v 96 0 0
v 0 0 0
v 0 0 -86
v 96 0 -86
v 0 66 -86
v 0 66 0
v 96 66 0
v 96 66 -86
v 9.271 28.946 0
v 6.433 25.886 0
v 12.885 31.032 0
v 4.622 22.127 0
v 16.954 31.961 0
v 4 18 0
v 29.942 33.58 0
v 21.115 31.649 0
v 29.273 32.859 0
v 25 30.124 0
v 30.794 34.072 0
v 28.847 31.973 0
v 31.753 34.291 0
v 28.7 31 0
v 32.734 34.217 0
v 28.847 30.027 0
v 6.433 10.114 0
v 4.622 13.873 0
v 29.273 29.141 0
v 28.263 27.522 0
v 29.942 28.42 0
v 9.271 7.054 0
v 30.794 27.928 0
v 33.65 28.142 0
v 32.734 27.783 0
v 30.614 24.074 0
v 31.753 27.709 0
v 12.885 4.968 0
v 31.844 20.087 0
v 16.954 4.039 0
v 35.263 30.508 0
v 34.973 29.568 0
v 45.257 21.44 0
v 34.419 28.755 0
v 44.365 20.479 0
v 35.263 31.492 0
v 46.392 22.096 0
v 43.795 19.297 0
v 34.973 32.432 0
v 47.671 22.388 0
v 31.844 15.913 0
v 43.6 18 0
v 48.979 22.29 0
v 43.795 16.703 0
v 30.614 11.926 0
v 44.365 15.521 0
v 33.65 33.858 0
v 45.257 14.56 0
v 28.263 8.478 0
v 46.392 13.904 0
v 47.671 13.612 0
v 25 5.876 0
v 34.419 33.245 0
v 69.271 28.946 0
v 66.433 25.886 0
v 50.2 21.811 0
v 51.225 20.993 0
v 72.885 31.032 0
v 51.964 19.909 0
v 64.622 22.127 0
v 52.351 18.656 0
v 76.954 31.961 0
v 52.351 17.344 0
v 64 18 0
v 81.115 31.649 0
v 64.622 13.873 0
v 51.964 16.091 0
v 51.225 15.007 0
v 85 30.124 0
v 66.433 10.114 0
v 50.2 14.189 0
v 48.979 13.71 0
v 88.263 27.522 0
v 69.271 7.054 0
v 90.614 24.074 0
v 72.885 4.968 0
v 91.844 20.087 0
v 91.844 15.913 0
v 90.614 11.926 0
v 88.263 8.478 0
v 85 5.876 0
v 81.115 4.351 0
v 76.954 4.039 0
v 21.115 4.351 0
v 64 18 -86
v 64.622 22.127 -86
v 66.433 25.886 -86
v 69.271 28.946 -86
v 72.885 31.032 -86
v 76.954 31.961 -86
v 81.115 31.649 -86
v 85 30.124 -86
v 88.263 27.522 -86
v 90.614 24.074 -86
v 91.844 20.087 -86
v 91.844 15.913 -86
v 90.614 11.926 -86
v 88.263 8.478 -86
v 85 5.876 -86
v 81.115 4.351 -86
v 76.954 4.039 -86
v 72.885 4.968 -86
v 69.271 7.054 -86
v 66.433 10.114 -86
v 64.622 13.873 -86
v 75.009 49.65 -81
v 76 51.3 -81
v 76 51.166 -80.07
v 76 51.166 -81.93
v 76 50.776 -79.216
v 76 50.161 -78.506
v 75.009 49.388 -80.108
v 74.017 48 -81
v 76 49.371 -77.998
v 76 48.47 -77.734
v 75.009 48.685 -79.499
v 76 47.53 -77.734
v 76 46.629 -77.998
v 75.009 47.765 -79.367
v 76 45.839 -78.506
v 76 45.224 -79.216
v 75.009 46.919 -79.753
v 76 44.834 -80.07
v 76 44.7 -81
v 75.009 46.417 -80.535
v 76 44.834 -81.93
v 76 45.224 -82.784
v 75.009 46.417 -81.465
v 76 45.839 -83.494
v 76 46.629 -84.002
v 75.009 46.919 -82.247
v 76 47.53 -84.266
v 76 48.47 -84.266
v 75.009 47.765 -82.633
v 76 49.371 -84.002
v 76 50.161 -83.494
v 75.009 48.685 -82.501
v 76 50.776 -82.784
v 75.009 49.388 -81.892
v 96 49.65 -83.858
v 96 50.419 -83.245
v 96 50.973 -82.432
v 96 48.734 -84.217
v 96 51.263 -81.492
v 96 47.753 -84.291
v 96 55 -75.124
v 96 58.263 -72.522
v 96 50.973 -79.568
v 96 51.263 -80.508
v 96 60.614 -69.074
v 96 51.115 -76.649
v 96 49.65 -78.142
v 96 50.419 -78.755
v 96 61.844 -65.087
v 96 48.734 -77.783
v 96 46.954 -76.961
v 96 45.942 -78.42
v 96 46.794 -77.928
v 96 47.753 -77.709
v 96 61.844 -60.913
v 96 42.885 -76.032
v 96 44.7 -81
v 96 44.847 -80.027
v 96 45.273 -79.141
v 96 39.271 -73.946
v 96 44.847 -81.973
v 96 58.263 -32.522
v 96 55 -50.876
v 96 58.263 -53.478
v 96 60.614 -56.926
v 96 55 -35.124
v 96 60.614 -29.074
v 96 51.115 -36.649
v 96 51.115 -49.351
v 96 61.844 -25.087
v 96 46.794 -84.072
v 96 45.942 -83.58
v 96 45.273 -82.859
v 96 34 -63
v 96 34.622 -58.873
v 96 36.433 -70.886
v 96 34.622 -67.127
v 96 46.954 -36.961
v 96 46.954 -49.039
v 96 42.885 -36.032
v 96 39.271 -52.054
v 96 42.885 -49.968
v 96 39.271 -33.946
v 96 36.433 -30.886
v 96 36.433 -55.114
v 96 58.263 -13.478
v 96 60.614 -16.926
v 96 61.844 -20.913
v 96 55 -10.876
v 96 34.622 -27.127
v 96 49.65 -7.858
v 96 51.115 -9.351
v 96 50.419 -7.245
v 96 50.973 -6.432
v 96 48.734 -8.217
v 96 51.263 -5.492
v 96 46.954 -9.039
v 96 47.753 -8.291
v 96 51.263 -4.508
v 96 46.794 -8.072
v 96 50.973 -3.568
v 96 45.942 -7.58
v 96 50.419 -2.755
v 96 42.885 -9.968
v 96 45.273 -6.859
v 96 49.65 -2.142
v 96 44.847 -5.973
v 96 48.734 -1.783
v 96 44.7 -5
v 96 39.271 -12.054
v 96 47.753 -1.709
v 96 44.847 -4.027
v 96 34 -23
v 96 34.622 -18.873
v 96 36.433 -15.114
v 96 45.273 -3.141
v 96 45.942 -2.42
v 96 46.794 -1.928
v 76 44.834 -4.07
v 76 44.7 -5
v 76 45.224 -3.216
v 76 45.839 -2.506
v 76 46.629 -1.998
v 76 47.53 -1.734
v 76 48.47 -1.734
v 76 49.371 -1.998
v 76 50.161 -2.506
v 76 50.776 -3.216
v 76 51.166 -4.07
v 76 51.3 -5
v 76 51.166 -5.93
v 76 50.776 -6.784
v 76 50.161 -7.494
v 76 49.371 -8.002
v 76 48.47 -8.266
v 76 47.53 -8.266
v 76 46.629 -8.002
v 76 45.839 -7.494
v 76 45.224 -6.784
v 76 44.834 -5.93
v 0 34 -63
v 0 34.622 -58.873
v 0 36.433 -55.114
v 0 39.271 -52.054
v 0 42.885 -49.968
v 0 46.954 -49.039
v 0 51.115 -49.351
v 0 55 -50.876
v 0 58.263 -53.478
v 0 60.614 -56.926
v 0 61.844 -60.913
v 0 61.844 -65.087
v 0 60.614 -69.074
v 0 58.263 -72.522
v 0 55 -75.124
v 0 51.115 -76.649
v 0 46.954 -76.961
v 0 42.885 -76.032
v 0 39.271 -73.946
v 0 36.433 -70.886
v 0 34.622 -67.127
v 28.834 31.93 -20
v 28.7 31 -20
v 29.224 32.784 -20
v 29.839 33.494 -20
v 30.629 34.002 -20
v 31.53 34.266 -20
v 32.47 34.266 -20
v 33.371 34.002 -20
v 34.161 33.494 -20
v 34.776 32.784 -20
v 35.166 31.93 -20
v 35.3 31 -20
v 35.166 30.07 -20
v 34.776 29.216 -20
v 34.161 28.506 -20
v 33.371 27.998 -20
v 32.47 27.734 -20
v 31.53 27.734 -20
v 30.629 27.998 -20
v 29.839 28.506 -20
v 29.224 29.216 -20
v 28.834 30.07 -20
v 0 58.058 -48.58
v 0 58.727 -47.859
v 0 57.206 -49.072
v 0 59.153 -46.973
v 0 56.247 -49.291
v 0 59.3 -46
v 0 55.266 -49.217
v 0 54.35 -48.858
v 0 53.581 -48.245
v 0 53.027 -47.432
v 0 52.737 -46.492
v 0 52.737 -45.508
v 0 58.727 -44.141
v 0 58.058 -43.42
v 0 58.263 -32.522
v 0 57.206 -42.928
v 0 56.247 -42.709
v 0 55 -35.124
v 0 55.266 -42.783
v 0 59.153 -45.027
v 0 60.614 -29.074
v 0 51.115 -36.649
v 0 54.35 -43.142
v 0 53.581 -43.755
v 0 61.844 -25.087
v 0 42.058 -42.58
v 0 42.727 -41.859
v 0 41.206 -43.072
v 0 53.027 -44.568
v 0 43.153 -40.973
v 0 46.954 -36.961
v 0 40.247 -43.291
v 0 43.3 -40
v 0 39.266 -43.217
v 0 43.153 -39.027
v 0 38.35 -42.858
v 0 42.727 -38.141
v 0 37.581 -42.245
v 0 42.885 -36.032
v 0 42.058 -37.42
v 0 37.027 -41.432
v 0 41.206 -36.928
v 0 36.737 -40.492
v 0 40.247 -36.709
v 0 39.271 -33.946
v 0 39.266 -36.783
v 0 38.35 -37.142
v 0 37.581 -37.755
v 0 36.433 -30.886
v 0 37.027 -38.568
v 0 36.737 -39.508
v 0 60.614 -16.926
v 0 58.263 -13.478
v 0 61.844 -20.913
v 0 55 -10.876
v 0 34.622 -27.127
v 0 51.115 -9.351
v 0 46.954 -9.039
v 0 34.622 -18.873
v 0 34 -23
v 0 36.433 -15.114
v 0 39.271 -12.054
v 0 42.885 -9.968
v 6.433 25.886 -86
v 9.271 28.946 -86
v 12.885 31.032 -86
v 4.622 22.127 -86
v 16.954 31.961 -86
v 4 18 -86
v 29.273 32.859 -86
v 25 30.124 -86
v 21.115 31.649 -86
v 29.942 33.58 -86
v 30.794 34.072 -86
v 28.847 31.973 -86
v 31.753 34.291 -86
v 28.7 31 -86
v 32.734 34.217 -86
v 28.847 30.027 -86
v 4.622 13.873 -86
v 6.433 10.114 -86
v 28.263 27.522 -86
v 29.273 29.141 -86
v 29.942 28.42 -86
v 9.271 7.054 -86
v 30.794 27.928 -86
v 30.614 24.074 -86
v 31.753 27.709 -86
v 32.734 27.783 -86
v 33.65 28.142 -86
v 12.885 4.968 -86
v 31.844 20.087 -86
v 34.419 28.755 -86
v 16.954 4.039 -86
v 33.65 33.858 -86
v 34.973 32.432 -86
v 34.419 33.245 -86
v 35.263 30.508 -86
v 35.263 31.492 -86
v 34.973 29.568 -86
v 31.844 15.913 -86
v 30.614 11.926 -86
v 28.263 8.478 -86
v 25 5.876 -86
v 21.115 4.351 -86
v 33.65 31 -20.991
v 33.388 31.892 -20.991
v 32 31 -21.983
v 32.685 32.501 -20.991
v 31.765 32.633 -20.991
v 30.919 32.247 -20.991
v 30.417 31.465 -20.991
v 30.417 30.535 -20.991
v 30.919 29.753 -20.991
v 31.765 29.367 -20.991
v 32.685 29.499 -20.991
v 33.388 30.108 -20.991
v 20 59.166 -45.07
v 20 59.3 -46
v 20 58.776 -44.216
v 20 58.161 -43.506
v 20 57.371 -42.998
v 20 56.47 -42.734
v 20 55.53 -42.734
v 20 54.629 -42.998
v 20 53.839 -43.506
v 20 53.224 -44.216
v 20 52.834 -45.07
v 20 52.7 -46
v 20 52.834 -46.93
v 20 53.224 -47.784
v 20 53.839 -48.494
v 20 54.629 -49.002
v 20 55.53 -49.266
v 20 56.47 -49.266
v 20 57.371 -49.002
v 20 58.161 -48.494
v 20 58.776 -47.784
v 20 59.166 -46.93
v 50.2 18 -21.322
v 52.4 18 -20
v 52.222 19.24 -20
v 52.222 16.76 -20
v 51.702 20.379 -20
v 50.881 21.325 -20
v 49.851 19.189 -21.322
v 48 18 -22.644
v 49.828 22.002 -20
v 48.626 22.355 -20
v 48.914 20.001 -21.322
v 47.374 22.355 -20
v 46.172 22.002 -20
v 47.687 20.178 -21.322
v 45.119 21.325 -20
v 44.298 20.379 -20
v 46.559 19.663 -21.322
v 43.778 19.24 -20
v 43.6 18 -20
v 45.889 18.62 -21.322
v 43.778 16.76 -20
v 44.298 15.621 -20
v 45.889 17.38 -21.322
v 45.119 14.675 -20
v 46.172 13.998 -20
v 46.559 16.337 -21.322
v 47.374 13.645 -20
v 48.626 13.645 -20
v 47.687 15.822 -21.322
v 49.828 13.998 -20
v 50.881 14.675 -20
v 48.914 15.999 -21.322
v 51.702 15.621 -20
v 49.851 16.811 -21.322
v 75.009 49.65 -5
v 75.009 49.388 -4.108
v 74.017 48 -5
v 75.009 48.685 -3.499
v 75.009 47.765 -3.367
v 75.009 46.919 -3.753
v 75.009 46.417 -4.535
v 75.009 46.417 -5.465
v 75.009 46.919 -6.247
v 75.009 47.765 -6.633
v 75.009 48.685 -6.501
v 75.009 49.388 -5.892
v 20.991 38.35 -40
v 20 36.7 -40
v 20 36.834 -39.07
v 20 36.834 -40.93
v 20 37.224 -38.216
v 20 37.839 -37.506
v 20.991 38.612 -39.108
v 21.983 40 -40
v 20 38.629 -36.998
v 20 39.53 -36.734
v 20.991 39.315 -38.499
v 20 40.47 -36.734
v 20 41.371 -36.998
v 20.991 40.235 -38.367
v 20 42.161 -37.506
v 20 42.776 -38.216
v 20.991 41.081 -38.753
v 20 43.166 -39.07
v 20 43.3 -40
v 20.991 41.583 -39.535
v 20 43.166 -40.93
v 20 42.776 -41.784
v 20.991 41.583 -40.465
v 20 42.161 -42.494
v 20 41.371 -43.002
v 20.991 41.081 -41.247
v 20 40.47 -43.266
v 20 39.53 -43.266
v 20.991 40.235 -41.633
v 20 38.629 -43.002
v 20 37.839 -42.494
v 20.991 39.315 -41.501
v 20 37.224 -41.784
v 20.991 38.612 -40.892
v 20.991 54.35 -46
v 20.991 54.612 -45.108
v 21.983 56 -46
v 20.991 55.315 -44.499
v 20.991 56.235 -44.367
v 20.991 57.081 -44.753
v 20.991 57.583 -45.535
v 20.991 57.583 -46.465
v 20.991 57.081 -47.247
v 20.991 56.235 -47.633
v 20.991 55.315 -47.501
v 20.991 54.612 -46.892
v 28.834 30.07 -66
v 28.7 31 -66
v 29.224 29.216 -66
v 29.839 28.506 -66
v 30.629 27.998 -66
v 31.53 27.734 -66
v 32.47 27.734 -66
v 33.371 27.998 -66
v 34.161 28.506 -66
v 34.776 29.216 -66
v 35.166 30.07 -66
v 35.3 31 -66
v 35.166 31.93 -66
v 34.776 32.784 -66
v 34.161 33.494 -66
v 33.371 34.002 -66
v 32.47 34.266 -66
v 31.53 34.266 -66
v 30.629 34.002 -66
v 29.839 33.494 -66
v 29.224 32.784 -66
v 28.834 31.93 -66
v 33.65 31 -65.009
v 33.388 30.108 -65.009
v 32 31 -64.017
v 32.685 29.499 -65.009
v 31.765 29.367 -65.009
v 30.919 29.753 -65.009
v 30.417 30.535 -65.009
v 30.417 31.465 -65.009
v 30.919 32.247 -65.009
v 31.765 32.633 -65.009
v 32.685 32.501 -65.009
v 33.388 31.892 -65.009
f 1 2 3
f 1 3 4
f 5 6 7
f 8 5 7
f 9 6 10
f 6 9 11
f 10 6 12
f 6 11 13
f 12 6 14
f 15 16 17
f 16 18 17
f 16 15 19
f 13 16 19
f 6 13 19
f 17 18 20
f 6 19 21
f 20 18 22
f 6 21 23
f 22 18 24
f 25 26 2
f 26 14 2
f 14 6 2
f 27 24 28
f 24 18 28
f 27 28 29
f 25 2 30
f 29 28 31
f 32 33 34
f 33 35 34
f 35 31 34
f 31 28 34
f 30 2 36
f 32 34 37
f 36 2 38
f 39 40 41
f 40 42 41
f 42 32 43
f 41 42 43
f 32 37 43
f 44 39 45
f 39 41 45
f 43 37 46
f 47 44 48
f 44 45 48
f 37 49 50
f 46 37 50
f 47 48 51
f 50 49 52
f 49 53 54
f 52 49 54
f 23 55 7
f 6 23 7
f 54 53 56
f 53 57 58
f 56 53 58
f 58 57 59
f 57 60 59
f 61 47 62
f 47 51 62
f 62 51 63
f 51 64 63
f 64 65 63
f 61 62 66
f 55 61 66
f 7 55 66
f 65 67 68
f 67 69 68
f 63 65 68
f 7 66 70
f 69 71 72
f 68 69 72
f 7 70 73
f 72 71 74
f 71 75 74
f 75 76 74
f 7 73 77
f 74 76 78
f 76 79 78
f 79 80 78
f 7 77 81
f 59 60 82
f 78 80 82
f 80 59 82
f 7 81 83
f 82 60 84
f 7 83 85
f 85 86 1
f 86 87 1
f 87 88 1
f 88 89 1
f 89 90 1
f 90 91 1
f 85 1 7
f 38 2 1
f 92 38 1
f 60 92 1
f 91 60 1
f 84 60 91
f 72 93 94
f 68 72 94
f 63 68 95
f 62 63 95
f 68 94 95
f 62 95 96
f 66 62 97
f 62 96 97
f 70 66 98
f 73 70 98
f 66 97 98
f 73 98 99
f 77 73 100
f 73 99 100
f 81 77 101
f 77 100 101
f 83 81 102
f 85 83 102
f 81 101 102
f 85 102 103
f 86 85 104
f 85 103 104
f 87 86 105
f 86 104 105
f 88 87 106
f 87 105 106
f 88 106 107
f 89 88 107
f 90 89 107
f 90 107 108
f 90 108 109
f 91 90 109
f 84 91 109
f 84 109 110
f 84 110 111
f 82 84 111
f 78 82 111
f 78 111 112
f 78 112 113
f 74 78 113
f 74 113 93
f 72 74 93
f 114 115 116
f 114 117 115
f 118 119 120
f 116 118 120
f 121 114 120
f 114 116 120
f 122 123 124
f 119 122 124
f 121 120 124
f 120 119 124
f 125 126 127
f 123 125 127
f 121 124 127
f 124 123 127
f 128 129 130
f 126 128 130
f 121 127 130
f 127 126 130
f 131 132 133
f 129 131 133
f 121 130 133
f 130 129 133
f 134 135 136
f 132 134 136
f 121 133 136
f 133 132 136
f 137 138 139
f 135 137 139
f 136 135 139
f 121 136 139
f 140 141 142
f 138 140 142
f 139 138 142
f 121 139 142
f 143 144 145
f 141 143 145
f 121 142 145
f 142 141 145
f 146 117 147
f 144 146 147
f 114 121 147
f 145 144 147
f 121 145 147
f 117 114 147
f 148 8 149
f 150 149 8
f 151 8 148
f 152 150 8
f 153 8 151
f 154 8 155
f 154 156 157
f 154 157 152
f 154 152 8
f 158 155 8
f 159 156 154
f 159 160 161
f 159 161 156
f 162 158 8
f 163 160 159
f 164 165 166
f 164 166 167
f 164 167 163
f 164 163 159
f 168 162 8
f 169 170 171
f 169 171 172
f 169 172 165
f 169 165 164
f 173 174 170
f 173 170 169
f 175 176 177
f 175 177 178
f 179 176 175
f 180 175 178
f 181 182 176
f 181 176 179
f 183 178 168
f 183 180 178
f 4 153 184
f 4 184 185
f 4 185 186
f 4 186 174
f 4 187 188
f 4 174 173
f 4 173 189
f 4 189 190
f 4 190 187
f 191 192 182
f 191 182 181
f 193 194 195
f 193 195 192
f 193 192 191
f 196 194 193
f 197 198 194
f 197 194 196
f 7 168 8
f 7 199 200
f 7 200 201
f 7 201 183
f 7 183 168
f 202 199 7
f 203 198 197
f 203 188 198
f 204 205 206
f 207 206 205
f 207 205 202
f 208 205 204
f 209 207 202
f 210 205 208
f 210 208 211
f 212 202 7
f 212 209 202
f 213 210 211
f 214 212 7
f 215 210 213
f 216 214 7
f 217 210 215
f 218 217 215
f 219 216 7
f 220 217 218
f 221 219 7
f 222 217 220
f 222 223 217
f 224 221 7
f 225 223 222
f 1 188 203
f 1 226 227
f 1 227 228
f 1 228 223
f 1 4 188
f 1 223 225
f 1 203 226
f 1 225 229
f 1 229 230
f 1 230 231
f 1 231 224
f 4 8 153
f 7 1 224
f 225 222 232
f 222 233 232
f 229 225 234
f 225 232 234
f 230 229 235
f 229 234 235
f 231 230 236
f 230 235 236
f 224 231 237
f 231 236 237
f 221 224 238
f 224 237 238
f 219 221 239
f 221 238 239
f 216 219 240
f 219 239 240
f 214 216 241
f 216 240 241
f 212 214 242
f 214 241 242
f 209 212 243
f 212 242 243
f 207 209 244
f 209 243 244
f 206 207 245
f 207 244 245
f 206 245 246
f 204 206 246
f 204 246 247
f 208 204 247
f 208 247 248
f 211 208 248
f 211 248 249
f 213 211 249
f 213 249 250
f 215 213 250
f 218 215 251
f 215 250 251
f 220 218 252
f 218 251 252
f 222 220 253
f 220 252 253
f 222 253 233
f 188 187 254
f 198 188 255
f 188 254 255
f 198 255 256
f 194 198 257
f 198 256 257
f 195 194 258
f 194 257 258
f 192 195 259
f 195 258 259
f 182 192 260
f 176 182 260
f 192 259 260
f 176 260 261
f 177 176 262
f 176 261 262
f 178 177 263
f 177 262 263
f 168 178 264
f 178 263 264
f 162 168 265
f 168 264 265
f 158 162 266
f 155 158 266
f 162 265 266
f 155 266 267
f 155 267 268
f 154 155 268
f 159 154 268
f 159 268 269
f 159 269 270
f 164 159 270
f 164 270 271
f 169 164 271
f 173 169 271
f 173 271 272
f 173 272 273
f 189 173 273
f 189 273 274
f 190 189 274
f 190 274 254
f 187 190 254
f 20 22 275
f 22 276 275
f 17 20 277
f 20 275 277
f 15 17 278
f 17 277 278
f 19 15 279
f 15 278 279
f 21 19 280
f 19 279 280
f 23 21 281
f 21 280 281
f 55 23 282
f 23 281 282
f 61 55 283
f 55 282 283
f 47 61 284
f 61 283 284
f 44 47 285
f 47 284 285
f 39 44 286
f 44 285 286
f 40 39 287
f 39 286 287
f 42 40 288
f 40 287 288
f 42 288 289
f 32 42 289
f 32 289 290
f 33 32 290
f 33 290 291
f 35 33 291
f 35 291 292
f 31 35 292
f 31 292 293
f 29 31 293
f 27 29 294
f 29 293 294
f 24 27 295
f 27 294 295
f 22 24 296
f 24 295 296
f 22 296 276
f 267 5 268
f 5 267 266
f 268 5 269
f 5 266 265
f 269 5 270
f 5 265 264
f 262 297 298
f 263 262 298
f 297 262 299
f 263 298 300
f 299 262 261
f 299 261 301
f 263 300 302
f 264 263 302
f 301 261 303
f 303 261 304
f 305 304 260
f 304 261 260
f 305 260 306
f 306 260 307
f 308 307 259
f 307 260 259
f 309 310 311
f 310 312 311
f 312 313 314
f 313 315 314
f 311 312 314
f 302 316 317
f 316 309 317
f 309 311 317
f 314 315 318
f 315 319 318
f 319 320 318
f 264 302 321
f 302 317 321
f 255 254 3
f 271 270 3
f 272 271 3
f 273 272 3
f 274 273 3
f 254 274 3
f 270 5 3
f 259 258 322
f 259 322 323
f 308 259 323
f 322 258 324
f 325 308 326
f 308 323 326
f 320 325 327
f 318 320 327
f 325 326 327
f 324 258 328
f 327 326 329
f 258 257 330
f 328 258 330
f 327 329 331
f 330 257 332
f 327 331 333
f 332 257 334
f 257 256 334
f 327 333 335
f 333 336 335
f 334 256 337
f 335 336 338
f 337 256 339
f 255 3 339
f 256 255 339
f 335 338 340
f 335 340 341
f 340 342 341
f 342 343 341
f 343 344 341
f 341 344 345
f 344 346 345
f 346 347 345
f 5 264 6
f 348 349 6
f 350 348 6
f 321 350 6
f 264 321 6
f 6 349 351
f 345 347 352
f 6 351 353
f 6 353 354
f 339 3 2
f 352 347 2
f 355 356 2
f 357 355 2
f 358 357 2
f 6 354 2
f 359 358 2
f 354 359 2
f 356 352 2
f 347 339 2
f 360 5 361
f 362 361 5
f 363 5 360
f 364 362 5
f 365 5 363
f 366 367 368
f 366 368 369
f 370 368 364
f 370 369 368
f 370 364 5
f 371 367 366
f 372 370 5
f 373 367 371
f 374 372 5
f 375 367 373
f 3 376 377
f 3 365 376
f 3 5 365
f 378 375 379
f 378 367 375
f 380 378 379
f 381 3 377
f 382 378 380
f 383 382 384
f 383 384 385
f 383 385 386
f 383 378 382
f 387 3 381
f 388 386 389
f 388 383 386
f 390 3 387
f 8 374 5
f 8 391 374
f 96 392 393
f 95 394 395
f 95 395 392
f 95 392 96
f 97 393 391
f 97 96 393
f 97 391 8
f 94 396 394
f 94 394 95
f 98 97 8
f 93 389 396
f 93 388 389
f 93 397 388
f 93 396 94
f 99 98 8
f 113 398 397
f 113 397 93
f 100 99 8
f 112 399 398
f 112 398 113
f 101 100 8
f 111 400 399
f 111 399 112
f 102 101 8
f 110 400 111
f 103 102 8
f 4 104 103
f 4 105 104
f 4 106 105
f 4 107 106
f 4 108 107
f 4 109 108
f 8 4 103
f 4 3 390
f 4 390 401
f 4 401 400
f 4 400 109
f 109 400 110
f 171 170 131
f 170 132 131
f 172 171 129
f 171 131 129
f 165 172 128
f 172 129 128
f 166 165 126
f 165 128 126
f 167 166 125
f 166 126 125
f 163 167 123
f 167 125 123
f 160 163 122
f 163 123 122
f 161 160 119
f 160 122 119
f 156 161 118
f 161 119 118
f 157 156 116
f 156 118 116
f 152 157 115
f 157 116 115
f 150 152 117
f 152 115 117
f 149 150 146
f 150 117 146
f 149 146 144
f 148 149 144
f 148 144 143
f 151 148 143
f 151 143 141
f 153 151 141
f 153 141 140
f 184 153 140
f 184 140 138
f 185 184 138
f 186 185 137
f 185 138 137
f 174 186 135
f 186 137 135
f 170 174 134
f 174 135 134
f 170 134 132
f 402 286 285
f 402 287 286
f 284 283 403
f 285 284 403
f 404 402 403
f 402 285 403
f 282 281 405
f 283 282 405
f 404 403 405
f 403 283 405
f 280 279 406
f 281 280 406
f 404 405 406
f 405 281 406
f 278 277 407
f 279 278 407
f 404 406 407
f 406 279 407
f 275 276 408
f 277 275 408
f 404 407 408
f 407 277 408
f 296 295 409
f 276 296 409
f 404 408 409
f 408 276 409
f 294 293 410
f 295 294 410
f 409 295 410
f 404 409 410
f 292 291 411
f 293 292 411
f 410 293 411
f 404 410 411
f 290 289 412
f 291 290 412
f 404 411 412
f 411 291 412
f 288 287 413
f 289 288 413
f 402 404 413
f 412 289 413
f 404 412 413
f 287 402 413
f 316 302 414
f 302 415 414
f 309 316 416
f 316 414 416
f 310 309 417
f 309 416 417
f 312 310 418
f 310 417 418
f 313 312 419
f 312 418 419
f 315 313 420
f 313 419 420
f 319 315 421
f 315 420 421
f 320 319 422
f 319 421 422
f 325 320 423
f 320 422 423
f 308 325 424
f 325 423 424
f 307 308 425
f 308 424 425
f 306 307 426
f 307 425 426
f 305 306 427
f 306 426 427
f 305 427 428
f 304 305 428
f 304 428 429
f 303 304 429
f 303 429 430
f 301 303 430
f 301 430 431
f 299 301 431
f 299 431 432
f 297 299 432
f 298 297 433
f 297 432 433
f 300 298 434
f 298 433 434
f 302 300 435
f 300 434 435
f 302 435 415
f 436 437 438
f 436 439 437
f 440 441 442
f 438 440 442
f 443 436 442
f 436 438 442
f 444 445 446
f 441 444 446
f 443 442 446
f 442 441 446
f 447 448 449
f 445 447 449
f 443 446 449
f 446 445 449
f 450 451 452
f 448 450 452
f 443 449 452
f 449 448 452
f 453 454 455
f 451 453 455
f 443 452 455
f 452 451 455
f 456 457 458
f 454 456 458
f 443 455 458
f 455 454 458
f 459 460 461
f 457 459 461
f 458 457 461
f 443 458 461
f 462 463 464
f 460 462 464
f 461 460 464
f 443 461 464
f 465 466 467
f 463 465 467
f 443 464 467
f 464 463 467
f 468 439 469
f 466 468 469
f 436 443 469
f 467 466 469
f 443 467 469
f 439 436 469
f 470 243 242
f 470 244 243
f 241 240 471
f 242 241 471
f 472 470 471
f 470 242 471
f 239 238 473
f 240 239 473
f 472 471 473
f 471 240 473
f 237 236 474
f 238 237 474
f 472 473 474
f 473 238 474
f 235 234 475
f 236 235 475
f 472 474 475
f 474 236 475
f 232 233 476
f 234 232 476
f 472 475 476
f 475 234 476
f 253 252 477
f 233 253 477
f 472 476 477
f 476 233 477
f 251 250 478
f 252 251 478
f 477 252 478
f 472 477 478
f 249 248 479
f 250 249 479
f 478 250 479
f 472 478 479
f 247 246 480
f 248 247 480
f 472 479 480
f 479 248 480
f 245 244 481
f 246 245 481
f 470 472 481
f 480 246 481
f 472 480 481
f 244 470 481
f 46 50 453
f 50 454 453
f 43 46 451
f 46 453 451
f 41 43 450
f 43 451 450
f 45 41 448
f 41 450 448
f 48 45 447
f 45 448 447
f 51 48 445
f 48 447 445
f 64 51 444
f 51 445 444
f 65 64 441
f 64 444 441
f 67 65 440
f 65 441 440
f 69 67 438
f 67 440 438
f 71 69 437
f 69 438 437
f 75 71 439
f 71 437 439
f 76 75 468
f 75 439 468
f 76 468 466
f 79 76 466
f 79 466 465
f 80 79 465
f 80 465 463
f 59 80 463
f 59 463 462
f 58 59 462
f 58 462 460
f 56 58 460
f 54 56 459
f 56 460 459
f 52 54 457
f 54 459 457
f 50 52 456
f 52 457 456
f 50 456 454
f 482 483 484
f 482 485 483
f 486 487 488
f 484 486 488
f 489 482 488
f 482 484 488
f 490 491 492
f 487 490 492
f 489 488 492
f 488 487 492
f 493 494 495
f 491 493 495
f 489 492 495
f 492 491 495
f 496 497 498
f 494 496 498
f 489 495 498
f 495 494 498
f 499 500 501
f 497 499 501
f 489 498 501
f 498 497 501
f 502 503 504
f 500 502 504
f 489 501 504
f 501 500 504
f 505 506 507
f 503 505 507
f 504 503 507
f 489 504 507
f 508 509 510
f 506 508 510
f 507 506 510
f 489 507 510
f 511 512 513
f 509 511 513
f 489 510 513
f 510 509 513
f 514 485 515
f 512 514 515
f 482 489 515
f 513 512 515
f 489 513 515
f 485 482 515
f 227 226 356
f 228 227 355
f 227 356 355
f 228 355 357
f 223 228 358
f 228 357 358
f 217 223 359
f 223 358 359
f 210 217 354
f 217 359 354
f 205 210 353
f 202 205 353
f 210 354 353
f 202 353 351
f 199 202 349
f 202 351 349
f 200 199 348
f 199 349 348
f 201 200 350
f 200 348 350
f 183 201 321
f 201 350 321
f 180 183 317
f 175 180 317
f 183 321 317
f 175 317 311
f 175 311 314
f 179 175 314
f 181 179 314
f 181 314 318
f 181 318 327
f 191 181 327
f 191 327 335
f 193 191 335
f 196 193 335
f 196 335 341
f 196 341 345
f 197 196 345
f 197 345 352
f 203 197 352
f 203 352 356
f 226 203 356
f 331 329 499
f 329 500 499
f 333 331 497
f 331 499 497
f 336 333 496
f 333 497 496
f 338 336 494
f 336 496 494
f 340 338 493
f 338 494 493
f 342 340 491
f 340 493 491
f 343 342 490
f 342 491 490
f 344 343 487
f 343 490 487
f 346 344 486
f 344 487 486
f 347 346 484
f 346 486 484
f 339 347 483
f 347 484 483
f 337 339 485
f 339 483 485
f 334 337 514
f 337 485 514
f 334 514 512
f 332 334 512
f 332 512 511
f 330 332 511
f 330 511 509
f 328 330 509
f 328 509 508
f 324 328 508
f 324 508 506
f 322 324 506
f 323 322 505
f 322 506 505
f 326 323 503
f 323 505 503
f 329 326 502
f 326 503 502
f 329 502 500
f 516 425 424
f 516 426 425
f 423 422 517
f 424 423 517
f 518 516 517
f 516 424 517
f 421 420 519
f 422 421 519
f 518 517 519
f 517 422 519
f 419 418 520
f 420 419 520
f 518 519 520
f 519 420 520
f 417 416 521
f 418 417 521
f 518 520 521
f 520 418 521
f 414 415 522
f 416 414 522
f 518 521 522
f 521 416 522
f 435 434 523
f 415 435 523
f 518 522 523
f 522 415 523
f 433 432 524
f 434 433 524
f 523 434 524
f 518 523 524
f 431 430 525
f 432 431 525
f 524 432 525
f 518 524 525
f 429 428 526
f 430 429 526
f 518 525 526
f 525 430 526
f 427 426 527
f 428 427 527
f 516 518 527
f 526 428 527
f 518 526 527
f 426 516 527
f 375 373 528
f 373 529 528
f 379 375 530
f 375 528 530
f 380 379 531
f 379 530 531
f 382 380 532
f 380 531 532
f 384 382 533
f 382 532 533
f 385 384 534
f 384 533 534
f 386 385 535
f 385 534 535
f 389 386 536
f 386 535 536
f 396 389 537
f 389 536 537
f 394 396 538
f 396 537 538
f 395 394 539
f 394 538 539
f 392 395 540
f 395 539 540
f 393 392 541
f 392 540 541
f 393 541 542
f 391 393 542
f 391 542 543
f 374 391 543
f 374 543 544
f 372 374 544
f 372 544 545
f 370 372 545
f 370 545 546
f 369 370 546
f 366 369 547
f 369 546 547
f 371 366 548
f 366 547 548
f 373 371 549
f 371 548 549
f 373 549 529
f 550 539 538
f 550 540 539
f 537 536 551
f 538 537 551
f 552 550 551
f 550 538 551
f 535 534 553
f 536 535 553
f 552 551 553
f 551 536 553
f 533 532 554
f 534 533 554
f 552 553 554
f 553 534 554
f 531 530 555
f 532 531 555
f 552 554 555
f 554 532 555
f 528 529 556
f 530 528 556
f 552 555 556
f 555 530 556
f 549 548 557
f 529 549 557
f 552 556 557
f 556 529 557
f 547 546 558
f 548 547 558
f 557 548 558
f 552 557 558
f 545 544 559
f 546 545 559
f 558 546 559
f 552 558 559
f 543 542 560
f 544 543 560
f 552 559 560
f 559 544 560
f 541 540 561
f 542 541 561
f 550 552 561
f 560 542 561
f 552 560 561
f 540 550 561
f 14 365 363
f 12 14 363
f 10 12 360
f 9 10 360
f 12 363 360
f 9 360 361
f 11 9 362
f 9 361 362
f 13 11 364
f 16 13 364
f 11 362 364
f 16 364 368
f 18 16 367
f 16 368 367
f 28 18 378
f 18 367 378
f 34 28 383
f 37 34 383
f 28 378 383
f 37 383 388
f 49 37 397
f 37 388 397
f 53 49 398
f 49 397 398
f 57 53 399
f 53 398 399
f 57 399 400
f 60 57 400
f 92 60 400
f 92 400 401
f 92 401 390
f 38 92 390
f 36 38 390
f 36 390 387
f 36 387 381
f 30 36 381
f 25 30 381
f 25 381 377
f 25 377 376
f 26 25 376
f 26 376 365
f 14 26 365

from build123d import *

# Parameters (mm, degrees)
F0_W      = 96
F0_H      = 86
F1_DEPTH  = 66
F3_D      = 28
F5_D      = 28
F7_D      = 8.8
F7_DEPTH  = 20
F7_TIP    = 2.6437867237
F9_D      = 6.6
F9_DEPTH  = 20
F9_TIP    = 1.9828400428
F11_D     = 6.6
F11_DEPTH = 20
F11_TIP   = 1.9828400428
F13_D     = 6.6
F13_DEPTH = 20
F13_TIP   = 1.9828400428
F15_D     = 6.6
F15_DEPTH = 20
F15_TIP   = 1.9828400428


with BuildPart() as f1:
    # F0 (on Front) → F1 (new body)
    with BuildSketch(Plane.XZ):
        with Locations((48, -43)):
            Rectangle(F0_W, F0_H)
    extrude(amount=-F1_DEPTH)

    # F3 (through all)
    with Locations(Plane.XY):
        with Locations((18, 18), (78, 18)):
            Hole(F3_D / 2)

    # F5 (through all)
    with Locations(Plane.YZ.offset(96)):
        with Locations((48, -23), (48, -63)):
            Hole(F5_D / 2)

    # F7
    with Locations(Plane.XY):
        with Locations((48, 18)):
            Hole(F7_D / 2, depth=F7_DEPTH)
            with Locations((0, 0, -(F7_DEPTH + F7_TIP / 2))):  # 118° drill point
                Cone(0, F7_D / 2, F7_TIP, mode=Mode.SUBTRACT)

    # F9
    with Locations(Plane.XY):
        with Locations((32, 31)):
            Hole(F9_D / 2, depth=F9_DEPTH)
            with Locations((0, 0, -(F9_DEPTH + F9_TIP / 2))):  # 118° drill point
                Cone(0, F9_D / 2, F9_TIP, mode=Mode.SUBTRACT)

    # F11
    with Locations(Plane.YZ.offset(96)):
        with Locations((48, -81), (48, -5)):
            Hole(F11_D / 2, depth=F11_DEPTH)
            with Locations((0, 0, -(F11_DEPTH + F11_TIP / 2))):  # 118° drill point
                Cone(0, F11_D / 2, F11_TIP, mode=Mode.SUBTRACT)

    # F13
    with Locations(Plane(origin=(0, 0, -86), x_dir=(1, 0, 0), z_dir=(0, 0, -1))):
        with Locations((32, -31)):
            Hole(F13_D / 2, depth=F13_DEPTH)
            with Locations((0, 0, -(F13_DEPTH + F13_TIP / 2))):  # 118° drill point
                Cone(0, F13_D / 2, F13_TIP, mode=Mode.SUBTRACT)

    # F15
    with Locations(Plane(origin=(0, 0, 0), x_dir=(0, -1, 0), z_dir=(-1, 0, 0))):
        with Locations((-56, -46), (-40, -40)):
            Hole(F15_D / 2, depth=F15_DEPTH)
            with Locations((0, 0, -(F15_DEPTH + F15_TIP / 2))):  # 118° drill point
                Cone(0, F15_D / 2, F15_TIP, mode=Mode.SUBTRACT)


solid = f1.part
